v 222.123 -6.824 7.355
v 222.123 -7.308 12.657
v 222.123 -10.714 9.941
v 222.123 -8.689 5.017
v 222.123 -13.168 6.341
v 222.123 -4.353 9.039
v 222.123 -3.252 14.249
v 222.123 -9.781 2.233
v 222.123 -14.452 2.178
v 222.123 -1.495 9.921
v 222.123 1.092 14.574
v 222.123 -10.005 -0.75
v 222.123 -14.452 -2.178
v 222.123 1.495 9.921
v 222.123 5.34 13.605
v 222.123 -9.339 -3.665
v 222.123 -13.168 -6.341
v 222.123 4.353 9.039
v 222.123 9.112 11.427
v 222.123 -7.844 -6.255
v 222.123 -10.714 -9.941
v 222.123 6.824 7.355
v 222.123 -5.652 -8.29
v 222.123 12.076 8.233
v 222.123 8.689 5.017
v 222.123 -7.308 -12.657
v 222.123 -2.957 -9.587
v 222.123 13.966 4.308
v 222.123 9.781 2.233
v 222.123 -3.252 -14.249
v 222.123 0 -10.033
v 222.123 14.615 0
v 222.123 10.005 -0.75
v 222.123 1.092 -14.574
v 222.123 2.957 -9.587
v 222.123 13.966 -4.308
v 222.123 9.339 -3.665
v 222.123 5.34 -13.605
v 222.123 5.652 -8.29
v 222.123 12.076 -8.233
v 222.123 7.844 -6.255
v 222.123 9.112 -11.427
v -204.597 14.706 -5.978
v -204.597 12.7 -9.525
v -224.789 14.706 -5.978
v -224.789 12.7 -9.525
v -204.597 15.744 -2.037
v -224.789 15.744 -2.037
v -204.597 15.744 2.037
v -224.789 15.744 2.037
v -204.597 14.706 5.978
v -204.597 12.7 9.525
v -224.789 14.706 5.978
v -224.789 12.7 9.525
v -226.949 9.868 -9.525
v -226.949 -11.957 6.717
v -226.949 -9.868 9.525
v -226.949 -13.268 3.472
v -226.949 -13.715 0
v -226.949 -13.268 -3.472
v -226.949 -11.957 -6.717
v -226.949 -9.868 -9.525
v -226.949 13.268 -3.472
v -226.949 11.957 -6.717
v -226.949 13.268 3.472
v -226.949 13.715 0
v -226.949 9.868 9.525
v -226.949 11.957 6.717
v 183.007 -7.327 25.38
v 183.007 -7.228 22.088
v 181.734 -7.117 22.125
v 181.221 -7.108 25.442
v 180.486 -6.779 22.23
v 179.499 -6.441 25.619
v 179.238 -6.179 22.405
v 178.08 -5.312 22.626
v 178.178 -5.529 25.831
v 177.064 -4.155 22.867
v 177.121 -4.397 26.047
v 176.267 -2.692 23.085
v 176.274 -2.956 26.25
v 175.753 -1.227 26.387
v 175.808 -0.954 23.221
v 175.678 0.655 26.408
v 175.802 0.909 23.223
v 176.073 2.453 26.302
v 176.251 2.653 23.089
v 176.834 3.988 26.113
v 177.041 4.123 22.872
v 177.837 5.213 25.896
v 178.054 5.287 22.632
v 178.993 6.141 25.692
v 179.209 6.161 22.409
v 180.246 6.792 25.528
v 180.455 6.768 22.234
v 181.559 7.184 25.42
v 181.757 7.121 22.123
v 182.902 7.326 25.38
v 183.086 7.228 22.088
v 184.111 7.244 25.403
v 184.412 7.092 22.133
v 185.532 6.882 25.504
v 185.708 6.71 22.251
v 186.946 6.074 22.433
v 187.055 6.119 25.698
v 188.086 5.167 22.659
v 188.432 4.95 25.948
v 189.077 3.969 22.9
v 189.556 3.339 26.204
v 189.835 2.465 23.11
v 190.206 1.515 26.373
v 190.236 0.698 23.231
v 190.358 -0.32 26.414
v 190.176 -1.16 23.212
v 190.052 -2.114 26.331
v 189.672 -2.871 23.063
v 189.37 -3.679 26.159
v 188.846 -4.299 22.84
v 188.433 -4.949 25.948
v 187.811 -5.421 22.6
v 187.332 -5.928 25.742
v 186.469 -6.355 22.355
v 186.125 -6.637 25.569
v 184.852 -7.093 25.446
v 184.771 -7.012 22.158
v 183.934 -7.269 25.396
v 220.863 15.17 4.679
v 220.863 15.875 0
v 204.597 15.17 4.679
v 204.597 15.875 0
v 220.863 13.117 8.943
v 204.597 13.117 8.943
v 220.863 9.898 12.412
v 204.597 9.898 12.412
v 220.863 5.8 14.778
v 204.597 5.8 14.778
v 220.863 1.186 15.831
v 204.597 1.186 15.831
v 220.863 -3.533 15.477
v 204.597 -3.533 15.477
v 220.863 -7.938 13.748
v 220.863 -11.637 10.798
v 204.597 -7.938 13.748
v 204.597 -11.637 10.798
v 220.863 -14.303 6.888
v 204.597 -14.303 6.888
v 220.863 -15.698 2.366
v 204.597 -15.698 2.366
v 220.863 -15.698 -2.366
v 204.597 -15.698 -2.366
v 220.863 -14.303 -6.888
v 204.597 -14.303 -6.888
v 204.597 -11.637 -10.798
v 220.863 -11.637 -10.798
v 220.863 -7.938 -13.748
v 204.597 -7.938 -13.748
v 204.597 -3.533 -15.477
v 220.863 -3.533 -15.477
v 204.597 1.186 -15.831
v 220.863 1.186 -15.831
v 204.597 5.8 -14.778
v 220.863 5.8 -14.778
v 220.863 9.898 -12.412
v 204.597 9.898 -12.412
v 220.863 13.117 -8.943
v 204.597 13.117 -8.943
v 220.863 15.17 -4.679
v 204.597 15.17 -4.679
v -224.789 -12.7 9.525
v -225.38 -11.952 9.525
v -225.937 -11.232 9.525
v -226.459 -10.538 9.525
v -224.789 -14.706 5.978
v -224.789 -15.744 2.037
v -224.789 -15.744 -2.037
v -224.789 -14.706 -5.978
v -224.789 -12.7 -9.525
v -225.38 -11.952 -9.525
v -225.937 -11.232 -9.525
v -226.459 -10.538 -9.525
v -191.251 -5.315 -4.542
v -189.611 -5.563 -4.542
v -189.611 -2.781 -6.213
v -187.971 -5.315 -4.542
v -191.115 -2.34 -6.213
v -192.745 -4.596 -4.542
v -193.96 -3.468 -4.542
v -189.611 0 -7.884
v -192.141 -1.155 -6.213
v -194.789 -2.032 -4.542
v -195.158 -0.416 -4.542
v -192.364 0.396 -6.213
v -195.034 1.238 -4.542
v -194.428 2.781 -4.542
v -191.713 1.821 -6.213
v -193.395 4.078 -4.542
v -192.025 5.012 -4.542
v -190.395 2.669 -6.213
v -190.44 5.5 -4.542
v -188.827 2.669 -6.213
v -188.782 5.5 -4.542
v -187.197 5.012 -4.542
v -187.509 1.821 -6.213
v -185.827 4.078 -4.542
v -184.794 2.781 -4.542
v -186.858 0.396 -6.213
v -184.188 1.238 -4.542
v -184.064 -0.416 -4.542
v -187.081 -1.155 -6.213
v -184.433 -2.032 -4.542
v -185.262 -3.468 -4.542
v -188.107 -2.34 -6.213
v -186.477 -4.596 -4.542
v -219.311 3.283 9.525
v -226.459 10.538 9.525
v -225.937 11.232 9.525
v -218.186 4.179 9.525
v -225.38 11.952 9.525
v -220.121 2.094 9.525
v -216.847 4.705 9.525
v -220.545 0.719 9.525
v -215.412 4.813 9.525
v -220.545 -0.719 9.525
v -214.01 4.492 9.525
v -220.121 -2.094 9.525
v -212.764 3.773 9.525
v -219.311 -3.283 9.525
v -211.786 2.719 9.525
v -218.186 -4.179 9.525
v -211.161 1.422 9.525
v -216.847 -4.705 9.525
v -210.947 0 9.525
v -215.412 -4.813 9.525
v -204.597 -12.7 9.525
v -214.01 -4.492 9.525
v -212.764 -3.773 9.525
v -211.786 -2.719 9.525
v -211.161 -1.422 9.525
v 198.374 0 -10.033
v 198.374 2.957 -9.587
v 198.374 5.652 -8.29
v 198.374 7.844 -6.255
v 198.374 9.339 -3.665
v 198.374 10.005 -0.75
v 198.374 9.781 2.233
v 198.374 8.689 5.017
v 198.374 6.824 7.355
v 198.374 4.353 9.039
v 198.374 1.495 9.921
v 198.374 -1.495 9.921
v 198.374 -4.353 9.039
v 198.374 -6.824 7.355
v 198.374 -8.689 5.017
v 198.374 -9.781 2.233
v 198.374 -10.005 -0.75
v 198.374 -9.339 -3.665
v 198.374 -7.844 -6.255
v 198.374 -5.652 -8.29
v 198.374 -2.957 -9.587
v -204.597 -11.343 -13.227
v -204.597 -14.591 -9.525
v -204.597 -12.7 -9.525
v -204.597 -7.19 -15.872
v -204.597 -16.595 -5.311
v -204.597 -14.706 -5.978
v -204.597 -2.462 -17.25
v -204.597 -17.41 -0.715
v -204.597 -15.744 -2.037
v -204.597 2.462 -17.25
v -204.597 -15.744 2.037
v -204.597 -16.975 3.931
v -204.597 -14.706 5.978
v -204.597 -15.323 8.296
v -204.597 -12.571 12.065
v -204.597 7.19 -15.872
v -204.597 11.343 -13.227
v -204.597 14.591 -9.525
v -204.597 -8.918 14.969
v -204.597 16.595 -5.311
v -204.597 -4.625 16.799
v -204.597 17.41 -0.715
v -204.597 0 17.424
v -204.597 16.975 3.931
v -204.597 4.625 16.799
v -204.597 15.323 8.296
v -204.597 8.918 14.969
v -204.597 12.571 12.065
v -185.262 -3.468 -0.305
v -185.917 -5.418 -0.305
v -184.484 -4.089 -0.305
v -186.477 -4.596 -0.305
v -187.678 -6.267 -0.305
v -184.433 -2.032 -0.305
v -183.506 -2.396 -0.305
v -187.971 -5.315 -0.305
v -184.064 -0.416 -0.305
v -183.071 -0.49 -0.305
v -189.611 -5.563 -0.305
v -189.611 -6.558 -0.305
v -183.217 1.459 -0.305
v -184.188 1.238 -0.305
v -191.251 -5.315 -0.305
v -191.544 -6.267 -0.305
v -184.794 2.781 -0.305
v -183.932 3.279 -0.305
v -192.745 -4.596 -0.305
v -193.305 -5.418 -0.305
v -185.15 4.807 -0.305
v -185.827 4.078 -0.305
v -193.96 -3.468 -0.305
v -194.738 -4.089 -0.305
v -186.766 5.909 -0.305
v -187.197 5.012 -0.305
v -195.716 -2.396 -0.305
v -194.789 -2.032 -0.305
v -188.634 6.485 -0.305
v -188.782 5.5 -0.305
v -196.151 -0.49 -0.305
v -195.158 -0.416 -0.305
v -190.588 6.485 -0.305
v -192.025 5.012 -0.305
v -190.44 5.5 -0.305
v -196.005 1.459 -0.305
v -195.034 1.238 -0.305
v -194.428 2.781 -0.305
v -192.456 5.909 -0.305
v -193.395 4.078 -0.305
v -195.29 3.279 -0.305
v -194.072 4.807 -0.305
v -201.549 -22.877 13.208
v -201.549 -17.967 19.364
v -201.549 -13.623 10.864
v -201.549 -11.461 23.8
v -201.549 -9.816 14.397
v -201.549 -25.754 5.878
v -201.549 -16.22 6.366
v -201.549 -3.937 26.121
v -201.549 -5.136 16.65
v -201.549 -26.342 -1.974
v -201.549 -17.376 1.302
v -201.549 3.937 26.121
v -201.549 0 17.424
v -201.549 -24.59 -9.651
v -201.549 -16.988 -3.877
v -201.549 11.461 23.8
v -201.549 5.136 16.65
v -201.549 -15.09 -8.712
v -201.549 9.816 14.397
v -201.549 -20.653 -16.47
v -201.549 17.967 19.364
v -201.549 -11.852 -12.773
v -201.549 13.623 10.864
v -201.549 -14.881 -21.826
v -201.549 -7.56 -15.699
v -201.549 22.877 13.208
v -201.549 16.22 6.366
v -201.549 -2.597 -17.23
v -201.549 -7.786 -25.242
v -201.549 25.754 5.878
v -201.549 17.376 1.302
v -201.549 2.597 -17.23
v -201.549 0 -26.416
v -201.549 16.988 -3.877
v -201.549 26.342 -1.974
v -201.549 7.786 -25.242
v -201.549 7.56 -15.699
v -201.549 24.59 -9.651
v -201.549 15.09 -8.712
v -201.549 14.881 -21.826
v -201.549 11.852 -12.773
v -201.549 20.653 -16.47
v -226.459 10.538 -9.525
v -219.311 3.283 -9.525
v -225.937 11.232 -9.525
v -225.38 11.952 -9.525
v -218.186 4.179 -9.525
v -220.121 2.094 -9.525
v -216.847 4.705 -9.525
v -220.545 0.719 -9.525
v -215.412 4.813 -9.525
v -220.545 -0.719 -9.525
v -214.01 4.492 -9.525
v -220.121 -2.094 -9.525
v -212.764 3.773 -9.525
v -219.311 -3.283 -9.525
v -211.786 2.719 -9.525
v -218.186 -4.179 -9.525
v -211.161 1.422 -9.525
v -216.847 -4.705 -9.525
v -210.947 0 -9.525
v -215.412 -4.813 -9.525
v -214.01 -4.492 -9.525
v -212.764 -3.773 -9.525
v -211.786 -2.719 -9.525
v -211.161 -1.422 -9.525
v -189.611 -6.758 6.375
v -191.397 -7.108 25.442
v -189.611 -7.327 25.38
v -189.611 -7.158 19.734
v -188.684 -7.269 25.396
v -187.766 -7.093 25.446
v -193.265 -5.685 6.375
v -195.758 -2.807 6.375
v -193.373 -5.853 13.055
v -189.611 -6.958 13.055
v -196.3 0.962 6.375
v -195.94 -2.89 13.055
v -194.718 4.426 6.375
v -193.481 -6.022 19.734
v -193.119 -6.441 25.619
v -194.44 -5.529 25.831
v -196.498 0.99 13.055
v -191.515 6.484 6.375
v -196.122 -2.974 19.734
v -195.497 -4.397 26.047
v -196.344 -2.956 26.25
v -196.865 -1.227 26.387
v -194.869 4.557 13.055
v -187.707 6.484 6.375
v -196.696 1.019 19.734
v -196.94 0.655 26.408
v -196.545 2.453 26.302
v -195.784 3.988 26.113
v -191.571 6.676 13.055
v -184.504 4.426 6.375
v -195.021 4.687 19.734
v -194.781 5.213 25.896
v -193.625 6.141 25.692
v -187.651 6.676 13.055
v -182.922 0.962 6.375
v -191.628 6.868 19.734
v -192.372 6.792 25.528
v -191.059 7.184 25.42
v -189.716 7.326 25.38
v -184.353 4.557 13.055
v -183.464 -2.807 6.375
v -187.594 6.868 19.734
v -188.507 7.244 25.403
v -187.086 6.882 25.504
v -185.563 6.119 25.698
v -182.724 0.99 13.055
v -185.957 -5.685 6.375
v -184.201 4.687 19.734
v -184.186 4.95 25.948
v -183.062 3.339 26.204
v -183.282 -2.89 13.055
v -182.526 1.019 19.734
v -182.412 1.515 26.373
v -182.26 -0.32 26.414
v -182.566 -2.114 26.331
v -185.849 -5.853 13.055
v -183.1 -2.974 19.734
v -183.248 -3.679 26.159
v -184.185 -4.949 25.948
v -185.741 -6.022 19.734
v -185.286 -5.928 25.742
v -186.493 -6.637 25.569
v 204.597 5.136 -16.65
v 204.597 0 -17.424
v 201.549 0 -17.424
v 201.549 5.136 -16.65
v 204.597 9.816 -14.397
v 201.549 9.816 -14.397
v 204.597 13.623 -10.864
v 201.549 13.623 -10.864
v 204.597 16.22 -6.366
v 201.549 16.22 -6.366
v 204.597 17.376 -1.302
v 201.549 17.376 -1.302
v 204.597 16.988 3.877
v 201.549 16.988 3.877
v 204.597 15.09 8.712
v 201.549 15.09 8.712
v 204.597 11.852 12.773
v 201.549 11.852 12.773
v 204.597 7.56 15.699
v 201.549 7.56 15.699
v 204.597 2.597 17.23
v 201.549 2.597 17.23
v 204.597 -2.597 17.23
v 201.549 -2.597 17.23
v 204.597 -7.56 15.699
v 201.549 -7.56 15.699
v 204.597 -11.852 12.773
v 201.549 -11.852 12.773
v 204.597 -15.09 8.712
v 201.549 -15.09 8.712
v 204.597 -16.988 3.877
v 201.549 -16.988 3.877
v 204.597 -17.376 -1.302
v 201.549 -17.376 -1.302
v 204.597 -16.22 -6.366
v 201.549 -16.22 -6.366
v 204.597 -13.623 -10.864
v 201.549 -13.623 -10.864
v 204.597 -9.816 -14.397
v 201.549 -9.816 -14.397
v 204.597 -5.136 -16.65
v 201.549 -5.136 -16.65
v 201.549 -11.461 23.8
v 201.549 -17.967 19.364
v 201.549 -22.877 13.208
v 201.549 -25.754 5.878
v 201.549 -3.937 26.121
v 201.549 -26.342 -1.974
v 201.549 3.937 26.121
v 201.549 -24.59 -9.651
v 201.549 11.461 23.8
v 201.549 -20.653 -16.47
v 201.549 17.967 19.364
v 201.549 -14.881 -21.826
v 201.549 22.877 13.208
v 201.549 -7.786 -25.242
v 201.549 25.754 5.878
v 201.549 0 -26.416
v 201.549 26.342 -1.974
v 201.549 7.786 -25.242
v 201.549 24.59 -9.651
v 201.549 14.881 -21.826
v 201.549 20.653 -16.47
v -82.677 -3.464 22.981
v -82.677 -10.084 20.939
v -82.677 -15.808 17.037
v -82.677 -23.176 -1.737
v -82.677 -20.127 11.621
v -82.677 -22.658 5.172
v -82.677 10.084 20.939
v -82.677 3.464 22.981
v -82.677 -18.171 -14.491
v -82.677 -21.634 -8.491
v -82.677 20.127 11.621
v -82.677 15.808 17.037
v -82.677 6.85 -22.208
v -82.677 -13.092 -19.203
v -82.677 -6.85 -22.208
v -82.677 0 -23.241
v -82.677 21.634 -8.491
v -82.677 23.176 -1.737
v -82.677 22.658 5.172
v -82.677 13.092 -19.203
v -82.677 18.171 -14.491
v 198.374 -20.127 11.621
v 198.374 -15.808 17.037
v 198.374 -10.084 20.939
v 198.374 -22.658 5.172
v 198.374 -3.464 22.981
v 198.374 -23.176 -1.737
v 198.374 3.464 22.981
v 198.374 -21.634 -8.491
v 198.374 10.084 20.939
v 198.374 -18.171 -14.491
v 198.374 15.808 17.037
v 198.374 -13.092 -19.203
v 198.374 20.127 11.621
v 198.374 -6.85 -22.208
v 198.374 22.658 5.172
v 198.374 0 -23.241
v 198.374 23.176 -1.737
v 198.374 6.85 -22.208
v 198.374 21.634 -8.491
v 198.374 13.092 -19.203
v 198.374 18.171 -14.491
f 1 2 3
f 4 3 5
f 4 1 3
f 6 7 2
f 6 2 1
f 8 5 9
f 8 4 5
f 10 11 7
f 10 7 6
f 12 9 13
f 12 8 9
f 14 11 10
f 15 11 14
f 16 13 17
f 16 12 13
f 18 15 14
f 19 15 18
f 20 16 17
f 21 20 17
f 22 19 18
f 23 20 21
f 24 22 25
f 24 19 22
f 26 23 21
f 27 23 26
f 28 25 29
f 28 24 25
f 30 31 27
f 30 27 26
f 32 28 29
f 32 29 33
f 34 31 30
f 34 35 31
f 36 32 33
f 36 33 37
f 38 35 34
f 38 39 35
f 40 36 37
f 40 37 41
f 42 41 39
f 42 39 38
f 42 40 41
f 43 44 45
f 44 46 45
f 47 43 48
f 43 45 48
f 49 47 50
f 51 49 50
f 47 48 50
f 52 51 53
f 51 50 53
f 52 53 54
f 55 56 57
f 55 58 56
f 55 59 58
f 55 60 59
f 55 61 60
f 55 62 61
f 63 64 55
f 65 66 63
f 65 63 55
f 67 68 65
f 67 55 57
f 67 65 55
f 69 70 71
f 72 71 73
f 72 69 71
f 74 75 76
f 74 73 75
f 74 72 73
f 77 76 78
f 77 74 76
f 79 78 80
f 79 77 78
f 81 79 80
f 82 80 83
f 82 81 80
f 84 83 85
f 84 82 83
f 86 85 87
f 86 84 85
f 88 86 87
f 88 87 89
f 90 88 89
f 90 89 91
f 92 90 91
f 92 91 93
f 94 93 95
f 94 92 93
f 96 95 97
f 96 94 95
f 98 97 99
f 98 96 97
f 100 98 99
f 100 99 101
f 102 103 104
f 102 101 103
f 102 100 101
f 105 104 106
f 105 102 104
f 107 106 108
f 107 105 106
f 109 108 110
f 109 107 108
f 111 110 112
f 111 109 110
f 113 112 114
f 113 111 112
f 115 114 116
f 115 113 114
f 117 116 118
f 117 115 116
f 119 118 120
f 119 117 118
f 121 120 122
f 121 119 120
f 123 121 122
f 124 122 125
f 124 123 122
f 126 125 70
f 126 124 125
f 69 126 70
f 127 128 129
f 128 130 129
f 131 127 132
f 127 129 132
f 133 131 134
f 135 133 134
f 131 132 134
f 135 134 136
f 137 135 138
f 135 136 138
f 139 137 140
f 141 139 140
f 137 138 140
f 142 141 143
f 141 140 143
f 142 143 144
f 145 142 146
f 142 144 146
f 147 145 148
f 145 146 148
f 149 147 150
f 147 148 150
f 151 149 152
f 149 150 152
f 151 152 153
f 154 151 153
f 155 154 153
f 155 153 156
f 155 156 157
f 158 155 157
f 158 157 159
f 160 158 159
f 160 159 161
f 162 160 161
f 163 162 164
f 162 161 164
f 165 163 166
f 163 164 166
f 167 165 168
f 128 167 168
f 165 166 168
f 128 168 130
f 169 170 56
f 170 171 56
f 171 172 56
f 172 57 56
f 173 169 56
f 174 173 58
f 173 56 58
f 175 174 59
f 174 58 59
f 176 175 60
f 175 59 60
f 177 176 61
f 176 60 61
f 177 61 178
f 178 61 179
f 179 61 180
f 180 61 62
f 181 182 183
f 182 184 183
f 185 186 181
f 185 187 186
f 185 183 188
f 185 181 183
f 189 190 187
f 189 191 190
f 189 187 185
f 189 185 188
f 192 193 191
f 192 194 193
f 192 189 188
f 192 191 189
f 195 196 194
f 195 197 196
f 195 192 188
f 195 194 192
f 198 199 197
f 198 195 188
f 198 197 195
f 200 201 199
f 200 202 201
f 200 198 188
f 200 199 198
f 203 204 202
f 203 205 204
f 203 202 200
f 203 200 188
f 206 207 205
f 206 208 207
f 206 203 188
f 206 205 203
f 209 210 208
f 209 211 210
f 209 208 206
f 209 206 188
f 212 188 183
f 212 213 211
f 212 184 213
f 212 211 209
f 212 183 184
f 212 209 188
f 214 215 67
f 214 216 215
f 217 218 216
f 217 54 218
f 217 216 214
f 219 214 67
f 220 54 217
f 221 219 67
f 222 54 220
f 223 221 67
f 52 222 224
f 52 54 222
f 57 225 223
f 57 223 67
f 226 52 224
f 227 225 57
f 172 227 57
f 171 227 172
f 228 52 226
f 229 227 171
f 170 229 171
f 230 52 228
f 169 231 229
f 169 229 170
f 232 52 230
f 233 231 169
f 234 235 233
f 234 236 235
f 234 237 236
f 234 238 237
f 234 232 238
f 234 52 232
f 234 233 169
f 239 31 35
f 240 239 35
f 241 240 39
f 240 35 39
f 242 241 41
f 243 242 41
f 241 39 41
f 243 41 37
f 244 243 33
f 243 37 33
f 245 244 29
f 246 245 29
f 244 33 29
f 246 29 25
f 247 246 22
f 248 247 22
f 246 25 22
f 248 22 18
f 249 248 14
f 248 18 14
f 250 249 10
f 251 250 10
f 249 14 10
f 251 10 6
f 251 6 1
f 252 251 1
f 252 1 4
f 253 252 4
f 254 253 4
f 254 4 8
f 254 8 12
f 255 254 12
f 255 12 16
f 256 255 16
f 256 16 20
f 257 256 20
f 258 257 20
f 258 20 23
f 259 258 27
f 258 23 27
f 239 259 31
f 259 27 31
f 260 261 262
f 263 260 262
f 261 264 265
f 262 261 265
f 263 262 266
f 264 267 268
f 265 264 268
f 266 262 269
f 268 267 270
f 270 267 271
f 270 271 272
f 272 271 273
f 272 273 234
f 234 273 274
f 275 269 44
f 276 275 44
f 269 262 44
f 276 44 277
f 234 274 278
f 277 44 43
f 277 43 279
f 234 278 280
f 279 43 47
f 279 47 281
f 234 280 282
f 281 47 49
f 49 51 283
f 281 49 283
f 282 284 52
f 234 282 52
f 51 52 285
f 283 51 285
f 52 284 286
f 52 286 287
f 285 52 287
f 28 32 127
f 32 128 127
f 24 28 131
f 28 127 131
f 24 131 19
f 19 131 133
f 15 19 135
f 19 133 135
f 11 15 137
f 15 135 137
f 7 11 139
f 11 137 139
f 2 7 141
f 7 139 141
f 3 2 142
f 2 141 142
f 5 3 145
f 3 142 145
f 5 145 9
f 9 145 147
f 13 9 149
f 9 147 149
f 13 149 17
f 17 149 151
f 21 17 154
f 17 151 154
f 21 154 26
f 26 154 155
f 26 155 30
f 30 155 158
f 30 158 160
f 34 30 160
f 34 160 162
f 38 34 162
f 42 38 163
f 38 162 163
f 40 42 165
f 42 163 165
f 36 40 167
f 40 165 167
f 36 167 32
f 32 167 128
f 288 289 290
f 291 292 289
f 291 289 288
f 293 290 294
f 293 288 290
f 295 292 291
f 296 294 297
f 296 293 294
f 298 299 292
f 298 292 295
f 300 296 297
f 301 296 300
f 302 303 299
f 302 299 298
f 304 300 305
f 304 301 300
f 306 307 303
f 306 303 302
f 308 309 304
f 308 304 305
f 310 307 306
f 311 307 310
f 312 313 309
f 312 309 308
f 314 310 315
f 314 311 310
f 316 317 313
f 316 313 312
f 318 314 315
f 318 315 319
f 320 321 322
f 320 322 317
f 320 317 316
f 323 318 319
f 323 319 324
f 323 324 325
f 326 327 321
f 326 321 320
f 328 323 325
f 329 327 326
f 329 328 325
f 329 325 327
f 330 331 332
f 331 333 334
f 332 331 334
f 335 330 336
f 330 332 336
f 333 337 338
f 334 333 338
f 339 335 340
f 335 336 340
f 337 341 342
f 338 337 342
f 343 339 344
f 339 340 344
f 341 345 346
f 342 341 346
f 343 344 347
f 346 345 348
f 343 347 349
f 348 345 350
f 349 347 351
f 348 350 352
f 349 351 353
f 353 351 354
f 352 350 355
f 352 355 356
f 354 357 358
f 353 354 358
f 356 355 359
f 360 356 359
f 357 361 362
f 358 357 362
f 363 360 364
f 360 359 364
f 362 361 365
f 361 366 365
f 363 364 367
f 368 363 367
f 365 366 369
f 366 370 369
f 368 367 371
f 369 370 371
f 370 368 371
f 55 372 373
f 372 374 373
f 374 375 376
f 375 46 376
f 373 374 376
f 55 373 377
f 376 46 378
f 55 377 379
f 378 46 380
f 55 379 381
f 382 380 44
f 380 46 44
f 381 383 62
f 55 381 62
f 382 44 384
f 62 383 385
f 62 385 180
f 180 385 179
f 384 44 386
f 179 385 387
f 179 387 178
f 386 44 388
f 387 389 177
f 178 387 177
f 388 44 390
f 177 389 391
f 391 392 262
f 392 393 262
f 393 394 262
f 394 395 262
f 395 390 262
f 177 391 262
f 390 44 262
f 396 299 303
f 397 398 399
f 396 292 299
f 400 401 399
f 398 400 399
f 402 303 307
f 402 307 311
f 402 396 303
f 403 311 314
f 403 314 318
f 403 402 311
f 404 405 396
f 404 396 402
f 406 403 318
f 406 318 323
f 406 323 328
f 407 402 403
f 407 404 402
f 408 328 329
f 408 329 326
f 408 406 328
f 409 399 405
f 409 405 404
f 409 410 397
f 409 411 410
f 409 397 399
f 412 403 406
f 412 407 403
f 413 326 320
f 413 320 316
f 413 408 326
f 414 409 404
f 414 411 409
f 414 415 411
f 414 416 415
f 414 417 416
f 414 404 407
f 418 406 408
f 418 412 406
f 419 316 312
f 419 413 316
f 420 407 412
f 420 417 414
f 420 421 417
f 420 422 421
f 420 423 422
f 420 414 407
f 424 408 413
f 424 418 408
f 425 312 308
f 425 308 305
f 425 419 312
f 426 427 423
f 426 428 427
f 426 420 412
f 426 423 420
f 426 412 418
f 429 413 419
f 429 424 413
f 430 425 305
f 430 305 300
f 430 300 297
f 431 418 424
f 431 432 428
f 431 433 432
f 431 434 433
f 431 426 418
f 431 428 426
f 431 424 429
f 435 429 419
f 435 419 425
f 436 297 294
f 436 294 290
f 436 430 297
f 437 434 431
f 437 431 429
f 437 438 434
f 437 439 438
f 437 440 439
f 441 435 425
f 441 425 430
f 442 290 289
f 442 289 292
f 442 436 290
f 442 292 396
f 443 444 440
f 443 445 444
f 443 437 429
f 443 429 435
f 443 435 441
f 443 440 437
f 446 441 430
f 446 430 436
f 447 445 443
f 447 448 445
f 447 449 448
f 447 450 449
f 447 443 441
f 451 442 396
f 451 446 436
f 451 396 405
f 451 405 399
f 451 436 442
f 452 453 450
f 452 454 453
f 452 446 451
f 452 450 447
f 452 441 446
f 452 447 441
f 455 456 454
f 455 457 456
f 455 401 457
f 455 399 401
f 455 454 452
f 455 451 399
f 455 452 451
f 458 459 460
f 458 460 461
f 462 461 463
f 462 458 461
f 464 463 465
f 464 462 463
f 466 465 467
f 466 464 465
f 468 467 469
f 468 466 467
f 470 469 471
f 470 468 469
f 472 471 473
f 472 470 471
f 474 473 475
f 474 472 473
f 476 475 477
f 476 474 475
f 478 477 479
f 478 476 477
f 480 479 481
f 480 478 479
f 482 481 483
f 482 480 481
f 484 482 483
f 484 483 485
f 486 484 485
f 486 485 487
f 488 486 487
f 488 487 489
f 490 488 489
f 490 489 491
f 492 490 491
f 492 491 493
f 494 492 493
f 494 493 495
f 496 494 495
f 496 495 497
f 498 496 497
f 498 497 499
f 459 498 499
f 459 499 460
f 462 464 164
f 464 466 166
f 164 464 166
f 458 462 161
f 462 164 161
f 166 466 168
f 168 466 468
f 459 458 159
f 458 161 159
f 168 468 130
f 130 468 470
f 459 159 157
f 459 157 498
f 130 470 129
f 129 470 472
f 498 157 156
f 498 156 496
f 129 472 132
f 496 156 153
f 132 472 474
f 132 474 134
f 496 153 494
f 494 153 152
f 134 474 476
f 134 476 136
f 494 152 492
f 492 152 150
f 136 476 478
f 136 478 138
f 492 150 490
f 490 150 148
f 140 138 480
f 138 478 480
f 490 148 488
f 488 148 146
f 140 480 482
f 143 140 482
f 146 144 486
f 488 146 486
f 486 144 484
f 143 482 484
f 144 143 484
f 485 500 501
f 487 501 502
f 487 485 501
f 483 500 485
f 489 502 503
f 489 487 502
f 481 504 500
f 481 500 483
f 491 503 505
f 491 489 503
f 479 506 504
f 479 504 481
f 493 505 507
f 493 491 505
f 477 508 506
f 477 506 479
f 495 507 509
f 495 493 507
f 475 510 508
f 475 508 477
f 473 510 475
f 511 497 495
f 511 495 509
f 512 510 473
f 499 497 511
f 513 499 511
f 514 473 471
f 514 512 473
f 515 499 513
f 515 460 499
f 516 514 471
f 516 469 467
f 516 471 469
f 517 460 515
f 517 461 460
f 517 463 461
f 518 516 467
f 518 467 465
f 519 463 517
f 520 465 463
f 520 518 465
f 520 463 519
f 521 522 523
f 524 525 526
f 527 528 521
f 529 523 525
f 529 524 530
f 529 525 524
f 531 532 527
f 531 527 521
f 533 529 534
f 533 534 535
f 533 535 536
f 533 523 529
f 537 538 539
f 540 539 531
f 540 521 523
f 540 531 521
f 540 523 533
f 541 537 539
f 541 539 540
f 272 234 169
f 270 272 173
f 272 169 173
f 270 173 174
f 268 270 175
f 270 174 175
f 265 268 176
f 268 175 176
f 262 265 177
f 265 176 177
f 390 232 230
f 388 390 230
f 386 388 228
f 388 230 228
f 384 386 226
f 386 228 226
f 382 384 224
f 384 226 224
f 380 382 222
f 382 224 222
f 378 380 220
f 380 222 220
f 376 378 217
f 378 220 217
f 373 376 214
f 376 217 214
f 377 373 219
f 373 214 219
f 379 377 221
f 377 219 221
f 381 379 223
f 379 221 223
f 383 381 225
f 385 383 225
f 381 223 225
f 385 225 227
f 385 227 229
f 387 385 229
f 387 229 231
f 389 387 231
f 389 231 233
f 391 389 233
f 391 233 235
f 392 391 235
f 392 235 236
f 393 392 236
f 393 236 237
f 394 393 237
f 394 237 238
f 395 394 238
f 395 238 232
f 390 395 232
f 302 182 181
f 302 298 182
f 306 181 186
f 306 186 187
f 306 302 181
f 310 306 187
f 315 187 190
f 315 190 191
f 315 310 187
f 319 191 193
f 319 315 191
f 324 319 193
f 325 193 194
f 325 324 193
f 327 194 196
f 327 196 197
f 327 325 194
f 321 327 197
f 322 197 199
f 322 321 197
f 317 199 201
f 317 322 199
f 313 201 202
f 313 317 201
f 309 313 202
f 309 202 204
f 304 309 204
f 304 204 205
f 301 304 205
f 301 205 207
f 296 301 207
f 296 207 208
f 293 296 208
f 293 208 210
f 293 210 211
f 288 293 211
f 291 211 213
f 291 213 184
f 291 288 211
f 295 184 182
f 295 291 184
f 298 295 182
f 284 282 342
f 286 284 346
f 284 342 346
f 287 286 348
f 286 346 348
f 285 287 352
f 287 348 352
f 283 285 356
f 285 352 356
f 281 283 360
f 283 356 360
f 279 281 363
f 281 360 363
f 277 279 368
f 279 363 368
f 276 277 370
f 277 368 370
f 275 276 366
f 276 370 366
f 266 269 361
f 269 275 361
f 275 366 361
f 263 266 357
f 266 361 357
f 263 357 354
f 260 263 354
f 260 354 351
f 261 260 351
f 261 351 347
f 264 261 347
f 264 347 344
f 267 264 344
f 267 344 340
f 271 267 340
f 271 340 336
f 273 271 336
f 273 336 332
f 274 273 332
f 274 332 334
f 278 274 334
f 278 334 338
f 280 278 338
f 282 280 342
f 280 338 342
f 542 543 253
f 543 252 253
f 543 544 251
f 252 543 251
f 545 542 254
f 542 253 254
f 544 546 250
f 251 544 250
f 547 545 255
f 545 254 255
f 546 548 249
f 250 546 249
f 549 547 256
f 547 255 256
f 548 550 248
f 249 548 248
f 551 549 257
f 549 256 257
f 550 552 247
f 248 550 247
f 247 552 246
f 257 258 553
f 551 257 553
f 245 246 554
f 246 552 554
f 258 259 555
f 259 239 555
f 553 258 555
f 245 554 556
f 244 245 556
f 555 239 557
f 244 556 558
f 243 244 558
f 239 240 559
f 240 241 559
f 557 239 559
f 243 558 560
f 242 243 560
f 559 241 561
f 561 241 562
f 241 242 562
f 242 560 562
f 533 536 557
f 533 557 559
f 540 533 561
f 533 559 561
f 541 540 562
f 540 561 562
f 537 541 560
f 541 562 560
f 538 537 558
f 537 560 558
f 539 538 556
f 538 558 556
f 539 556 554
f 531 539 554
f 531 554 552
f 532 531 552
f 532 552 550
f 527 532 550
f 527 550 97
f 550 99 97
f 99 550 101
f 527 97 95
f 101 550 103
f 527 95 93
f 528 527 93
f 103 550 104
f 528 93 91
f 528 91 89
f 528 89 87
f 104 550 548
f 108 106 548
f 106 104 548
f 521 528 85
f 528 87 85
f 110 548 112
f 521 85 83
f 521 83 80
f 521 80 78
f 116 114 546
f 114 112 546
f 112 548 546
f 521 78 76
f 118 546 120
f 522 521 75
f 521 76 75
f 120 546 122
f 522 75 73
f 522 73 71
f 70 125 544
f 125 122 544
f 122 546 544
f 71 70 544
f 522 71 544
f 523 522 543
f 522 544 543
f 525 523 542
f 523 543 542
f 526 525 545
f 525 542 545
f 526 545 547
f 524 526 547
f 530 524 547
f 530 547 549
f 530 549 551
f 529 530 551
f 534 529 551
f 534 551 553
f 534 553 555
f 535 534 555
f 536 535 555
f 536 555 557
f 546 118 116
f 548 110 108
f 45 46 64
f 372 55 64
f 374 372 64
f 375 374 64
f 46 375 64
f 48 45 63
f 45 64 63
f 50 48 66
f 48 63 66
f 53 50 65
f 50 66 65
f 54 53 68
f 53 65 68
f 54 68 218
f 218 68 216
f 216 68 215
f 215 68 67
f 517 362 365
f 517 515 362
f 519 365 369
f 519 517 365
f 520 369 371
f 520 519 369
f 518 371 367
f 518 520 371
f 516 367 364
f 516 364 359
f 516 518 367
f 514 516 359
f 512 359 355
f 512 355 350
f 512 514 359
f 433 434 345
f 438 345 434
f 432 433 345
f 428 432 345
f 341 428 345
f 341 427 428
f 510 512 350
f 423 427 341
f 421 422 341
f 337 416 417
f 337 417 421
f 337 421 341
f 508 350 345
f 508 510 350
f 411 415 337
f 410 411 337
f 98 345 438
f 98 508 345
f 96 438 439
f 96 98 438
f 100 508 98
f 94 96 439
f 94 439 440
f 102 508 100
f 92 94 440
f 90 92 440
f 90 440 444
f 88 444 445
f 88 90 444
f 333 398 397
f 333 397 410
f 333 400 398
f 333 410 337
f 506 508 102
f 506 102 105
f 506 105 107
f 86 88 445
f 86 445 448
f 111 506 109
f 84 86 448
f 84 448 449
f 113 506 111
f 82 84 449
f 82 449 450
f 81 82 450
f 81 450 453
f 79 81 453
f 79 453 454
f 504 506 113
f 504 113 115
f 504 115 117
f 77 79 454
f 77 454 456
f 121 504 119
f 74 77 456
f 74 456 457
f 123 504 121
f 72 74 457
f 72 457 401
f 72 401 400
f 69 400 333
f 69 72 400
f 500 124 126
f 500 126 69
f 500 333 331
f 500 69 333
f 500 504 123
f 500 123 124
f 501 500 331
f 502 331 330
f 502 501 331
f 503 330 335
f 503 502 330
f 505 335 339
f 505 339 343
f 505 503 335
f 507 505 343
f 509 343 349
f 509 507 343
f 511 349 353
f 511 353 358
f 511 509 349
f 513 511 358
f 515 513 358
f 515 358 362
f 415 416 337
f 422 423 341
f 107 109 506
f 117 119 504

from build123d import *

# Parameters (mm, degrees)
SKETCH1_R                         = 26.416
BOSS_EXTRUDE1_DEPTH               = 201.549
SKETCH8_R                         = 17.4244
BOSS_EXTRUDE2_DEPTH               = 25.4
CUT_EXTRUDE1_START                = -22.352
CUT_EXTRUDE1_DEPTH                = 22.352
SKETCH16_R                        = 4.826
CUT_EXTRUDE2_DEPTH                = 232.290745898
BOSS_EXTRUDE3_START               = 20.574
SKETCH17_R                        = 17.4244
BOSS_EXTRUDE3_DEPTH               = 20.574
SKETCH20_R                        = 10.033
CUT_EXTRUDE3_DEPTH                = 23.749
SKETCH22_R                        = 23.241
CUT_EXTRUDE4_DEPTH                = 281.051
F_1_4_NPT_TAPPED_HOLE3_AT_2_COUNT = 2
F_1_4_NPT_TAPPED_HOLE3_AT_2_PITCH = 372.618


# Read off the part's stored shape, not the designer's step: 1-1/4-7 Machine Threads Stud1, 1-1/4-12 Machine Threads Stud1
with BuildPart() as part:
    # Sketch1 → Boss-Extrude1 (new, symmetric)
    with BuildSketch(Plane(origin=(0, 0, 0), x_dir=(0, 0, -1), z_dir=(1, 0, 0))):
        Circle(SKETCH1_R)
    extrude(amount=BOSS_EXTRUDE1_DEPTH, both=True)

    # Sketch8 → Boss-Extrude2 (add)
    with BuildSketch(Plane.ZY.offset(201.549)):
        Circle(SKETCH8_R)
    extrude(amount=BOSS_EXTRUDE2_DEPTH)

    # 1-1/4-7 Machine Threads Stud1 outline → 1-1/4-7 Machine Threads Stud1 (revolve, cut)
    with BuildSketch(Plane.YX):
        Polygon((13.71473, -226.949), (17.4244, -226.949), (17.4244, -204.597), (15.875, -204.597), (15.875, -224.78873), align=None)
    revolve(axis=Axis((0, 0, 0), (1, 0, 0)), mode=Mode.SUBTRACT)

    # Sketch15 → Cut-Extrude1 (cut)
    with BuildSketch(Plane.ZY.offset(226.949).offset(CUT_EXTRUDE1_START)):
        with BuildLine():
            Line((-9.525, 14.59054798), (-9.525, -14.59054798))
            ThreePointArc((-9.525, -14.59054798), (-17.4244, 0), (-9.525, 14.59054798))
        make_face()
        with BuildLine():
            Line((9.525, 14.59054798), (9.525, -14.59054798))
            ThreePointArc((9.525, -14.59054798), (17.4244, 0), (9.525, 14.59054798))
        make_face()
    extrude(amount=CUT_EXTRUDE1_DEPTH, mode=Mode.SUBTRACT)

    # Sketch16 → Cut-Extrude2 (cut, through all)
    with BuildSketch(Plane.XY.offset(9.525)):
        with Locations((-215.773, 0)):
            Circle(SKETCH16_R)
    extrude(amount=-CUT_EXTRUDE2_DEPTH, mode=Mode.SUBTRACT)

    # Sketch17 → Boss-Extrude3 (add)
    with BuildSketch(Plane(origin=(201.549, 0, 0), x_dir=(0, 0, -1), z_dir=(1, 0, 0)).offset(BOSS_EXTRUDE3_START)):
        Circle(SKETCH17_R)
    extrude(amount=-BOSS_EXTRUDE3_DEPTH)

    # Sketch20 → Cut-Extrude3 (cut)
    with BuildSketch(Plane(origin=(222.123, 0, 0), x_dir=(0, 0, -1), z_dir=(1, 0, 0))):
        Circle(SKETCH20_R)
    extrude(amount=-CUT_EXTRUDE3_DEPTH, mode=Mode.SUBTRACT)

    # Sketch22 → Cut-Extrude4 (cut)
    with BuildSketch(Plane(origin=(198.374, 0, 0), x_dir=(0, 0, -1), z_dir=(1, 0, 0))):
        Circle(SKETCH22_R)
    extrude(amount=-CUT_EXTRUDE4_DEPTH, mode=Mode.SUBTRACT)

    # Sketch26 → 1/4 NPT Tapped Hole3 (revolve, cut)
    with BuildSketch(Plane(origin=(-189.611, 0, 26.416), x_dir=(0, -1, 0), z_dir=(1, 0, 0))):
        Polygon((0, 0), (0, 34.299867279), (5.5626, 30.95752), (5.5626, 26.7208), (6.557980564, 26.7208), (7.3580371, 0), align=None)
    f_1_4_npt_tapped_hole3 = revolve(axis=Axis((-189.611, 0, 32.766), (0, 0, -1)), mode=Mode.SUBTRACT)

    # 1/4 NPT Tapped Hole3 at 2: 1/4 NPT Tapped Hole3 ×2
    with Locations(*[(i * F_1_4_NPT_TAPPED_HOLE3_AT_2_PITCH, 0, 0) for i in range(1, F_1_4_NPT_TAPPED_HOLE3_AT_2_COUNT)]):
        add(f_1_4_npt_tapped_hole3, mode=Mode.SUBTRACT)

    # 1-1/4-12 Machine Threads Stud1 outline → 1-1/4-12 Machine Threads Stud1 (revolve, cut)
    with BuildSketch(Plane.YX):
        Polygon((17.4244, 222.123), (14.61516, 222.123), (15.875, 220.86316), (15.875, 204.597), (17.4244, 204.597), align=None)
    revolve(axis=Axis((0, 0, 0), (1, 0, 0)), mode=Mode.SUBTRACT)


solid = part.part
